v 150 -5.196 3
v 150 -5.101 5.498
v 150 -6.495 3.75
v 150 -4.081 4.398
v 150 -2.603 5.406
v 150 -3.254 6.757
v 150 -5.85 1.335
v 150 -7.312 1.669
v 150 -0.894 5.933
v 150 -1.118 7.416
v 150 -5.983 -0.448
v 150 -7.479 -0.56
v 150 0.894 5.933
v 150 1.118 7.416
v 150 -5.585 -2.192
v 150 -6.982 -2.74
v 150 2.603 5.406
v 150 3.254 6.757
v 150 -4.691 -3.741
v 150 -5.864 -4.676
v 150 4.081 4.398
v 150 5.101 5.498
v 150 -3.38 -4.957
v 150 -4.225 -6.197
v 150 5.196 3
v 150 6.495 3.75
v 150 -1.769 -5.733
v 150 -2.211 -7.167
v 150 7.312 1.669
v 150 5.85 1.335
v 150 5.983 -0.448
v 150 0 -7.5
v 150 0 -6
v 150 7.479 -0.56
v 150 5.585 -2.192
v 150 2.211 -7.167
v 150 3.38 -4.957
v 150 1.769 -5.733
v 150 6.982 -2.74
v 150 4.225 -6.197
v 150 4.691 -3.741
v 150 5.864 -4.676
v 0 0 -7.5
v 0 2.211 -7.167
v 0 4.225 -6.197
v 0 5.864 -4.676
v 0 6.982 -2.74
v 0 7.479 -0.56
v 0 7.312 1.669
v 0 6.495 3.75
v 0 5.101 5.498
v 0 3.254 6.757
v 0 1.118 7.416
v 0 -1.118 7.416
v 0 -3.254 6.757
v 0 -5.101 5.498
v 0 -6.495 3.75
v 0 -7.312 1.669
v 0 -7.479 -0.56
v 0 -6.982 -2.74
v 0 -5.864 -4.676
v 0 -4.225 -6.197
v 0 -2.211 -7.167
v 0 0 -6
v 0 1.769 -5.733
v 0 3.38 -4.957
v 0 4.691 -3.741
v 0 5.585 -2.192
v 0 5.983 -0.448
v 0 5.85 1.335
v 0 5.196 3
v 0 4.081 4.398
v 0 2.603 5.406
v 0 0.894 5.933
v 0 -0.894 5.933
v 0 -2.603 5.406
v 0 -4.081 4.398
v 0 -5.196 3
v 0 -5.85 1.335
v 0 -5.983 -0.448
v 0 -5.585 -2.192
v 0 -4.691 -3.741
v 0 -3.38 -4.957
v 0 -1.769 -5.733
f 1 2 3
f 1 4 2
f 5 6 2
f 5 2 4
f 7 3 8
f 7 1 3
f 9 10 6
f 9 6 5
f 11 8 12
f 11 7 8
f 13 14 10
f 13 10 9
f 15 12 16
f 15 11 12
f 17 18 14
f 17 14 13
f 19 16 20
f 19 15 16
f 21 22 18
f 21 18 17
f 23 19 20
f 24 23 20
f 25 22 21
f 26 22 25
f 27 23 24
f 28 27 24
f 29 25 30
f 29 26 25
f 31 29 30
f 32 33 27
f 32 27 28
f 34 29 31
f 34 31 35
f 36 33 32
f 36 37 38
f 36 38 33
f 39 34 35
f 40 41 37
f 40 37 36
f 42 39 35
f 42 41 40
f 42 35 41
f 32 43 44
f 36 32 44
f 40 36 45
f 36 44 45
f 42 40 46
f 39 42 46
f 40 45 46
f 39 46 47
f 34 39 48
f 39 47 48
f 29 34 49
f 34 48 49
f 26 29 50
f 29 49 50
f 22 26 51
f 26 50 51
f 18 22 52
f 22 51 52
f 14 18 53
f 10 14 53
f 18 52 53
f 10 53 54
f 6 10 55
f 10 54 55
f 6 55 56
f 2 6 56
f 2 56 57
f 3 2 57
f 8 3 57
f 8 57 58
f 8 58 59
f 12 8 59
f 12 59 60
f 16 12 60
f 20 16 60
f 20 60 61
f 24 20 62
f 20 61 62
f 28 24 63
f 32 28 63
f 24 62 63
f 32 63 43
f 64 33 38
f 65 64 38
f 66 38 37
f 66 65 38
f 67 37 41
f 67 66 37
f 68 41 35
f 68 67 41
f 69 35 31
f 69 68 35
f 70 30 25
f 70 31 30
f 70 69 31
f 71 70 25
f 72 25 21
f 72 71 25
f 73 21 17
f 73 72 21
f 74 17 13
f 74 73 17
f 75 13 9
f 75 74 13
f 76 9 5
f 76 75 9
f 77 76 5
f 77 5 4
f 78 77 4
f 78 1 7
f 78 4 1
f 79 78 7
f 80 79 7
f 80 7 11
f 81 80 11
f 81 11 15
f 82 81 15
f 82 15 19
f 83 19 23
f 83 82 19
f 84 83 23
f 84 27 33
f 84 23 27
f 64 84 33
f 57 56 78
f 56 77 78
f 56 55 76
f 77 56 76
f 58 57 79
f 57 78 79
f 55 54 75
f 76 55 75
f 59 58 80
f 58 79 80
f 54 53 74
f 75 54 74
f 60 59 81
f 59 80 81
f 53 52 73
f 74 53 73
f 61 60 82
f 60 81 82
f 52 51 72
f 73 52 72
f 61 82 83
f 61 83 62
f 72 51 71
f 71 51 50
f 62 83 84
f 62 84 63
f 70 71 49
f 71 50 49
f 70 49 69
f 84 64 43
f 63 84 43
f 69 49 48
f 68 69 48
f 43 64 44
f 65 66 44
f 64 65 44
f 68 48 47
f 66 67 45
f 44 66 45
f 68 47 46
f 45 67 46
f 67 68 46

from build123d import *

# Parameters (mm, degrees)
CYLINDER007_R           = 6
CYLINDER007_DEPTH       = 236
CYLINDER007_PITCH_ANGLE = 90
CYLINDER003_R           = 5.5
CYLINDER003_DEPTH       = 150
CYLINDER003_PITCH_ANGLE = 90
CYLINDER_R              = 7.5
CYLINDER_DEPTH          = 150
CYLINDER_PITCH_ANGLE    = 90


with BuildPart() as connector_bore:
    # Cylinder007 → Cylinder007 (new body)
    with BuildSketch(Plane.XY):
        Circle(CYLINDER007_R)
    extrude(amount=CYLINDER007_DEPTH)


with BuildPart() as connector_bore_1:
    # Cylinder007 pitch: moved
    add(connector_bore.part.rotate(Axis((0, 0, 0), (0, 1, 0)), CYLINDER007_PITCH_ANGLE))


with BuildPart() as connector_bore_2:
    # Cylinder007 placement: moved
    add(connector_bore_1.part.moved(Location((-45, 0, 0))))


with BuildPart() as pvc001:
    # Cylinder003 → Cylinder003 (new body)
    with BuildSketch(Plane.XY):
        Circle(CYLINDER003_R)
    extrude(amount=CYLINDER003_DEPTH)


with BuildPart() as pvc001_1:
    # Cylinder003 pitch: moved
    add(pvc001.part.rotate(Axis((0, 0, 0), (0, 1, 0)), CYLINDER003_PITCH_ANGLE))


with BuildPart() as pvc001_2:
    # Cylinder003 placement: moved
    add(pvc001_1.part)


with BuildPart() as cut006:
    # Cylinder → Cylinder (new body)
    with BuildSketch(Plane.XY):
        Circle(CYLINDER_R)
    extrude(amount=CYLINDER_DEPTH)


with BuildPart() as cut006_1:
    # Cylinder pitch: moved
    add(cut006.part.rotate(Axis((0, 0, 0), (0, 1, 0)), CYLINDER_PITCH_ANGLE))


with BuildPart() as cut006_2:
    # Cylinder placement: moved
    add(cut006_1.part)

    # Cut: cut pvc001
    add(pvc001_2.part, mode=Mode.SUBTRACT)

    # Cut006: cut connector_bore
    add(connector_bore_2.part, mode=Mode.SUBTRACT)


solid = cut006_2.part
